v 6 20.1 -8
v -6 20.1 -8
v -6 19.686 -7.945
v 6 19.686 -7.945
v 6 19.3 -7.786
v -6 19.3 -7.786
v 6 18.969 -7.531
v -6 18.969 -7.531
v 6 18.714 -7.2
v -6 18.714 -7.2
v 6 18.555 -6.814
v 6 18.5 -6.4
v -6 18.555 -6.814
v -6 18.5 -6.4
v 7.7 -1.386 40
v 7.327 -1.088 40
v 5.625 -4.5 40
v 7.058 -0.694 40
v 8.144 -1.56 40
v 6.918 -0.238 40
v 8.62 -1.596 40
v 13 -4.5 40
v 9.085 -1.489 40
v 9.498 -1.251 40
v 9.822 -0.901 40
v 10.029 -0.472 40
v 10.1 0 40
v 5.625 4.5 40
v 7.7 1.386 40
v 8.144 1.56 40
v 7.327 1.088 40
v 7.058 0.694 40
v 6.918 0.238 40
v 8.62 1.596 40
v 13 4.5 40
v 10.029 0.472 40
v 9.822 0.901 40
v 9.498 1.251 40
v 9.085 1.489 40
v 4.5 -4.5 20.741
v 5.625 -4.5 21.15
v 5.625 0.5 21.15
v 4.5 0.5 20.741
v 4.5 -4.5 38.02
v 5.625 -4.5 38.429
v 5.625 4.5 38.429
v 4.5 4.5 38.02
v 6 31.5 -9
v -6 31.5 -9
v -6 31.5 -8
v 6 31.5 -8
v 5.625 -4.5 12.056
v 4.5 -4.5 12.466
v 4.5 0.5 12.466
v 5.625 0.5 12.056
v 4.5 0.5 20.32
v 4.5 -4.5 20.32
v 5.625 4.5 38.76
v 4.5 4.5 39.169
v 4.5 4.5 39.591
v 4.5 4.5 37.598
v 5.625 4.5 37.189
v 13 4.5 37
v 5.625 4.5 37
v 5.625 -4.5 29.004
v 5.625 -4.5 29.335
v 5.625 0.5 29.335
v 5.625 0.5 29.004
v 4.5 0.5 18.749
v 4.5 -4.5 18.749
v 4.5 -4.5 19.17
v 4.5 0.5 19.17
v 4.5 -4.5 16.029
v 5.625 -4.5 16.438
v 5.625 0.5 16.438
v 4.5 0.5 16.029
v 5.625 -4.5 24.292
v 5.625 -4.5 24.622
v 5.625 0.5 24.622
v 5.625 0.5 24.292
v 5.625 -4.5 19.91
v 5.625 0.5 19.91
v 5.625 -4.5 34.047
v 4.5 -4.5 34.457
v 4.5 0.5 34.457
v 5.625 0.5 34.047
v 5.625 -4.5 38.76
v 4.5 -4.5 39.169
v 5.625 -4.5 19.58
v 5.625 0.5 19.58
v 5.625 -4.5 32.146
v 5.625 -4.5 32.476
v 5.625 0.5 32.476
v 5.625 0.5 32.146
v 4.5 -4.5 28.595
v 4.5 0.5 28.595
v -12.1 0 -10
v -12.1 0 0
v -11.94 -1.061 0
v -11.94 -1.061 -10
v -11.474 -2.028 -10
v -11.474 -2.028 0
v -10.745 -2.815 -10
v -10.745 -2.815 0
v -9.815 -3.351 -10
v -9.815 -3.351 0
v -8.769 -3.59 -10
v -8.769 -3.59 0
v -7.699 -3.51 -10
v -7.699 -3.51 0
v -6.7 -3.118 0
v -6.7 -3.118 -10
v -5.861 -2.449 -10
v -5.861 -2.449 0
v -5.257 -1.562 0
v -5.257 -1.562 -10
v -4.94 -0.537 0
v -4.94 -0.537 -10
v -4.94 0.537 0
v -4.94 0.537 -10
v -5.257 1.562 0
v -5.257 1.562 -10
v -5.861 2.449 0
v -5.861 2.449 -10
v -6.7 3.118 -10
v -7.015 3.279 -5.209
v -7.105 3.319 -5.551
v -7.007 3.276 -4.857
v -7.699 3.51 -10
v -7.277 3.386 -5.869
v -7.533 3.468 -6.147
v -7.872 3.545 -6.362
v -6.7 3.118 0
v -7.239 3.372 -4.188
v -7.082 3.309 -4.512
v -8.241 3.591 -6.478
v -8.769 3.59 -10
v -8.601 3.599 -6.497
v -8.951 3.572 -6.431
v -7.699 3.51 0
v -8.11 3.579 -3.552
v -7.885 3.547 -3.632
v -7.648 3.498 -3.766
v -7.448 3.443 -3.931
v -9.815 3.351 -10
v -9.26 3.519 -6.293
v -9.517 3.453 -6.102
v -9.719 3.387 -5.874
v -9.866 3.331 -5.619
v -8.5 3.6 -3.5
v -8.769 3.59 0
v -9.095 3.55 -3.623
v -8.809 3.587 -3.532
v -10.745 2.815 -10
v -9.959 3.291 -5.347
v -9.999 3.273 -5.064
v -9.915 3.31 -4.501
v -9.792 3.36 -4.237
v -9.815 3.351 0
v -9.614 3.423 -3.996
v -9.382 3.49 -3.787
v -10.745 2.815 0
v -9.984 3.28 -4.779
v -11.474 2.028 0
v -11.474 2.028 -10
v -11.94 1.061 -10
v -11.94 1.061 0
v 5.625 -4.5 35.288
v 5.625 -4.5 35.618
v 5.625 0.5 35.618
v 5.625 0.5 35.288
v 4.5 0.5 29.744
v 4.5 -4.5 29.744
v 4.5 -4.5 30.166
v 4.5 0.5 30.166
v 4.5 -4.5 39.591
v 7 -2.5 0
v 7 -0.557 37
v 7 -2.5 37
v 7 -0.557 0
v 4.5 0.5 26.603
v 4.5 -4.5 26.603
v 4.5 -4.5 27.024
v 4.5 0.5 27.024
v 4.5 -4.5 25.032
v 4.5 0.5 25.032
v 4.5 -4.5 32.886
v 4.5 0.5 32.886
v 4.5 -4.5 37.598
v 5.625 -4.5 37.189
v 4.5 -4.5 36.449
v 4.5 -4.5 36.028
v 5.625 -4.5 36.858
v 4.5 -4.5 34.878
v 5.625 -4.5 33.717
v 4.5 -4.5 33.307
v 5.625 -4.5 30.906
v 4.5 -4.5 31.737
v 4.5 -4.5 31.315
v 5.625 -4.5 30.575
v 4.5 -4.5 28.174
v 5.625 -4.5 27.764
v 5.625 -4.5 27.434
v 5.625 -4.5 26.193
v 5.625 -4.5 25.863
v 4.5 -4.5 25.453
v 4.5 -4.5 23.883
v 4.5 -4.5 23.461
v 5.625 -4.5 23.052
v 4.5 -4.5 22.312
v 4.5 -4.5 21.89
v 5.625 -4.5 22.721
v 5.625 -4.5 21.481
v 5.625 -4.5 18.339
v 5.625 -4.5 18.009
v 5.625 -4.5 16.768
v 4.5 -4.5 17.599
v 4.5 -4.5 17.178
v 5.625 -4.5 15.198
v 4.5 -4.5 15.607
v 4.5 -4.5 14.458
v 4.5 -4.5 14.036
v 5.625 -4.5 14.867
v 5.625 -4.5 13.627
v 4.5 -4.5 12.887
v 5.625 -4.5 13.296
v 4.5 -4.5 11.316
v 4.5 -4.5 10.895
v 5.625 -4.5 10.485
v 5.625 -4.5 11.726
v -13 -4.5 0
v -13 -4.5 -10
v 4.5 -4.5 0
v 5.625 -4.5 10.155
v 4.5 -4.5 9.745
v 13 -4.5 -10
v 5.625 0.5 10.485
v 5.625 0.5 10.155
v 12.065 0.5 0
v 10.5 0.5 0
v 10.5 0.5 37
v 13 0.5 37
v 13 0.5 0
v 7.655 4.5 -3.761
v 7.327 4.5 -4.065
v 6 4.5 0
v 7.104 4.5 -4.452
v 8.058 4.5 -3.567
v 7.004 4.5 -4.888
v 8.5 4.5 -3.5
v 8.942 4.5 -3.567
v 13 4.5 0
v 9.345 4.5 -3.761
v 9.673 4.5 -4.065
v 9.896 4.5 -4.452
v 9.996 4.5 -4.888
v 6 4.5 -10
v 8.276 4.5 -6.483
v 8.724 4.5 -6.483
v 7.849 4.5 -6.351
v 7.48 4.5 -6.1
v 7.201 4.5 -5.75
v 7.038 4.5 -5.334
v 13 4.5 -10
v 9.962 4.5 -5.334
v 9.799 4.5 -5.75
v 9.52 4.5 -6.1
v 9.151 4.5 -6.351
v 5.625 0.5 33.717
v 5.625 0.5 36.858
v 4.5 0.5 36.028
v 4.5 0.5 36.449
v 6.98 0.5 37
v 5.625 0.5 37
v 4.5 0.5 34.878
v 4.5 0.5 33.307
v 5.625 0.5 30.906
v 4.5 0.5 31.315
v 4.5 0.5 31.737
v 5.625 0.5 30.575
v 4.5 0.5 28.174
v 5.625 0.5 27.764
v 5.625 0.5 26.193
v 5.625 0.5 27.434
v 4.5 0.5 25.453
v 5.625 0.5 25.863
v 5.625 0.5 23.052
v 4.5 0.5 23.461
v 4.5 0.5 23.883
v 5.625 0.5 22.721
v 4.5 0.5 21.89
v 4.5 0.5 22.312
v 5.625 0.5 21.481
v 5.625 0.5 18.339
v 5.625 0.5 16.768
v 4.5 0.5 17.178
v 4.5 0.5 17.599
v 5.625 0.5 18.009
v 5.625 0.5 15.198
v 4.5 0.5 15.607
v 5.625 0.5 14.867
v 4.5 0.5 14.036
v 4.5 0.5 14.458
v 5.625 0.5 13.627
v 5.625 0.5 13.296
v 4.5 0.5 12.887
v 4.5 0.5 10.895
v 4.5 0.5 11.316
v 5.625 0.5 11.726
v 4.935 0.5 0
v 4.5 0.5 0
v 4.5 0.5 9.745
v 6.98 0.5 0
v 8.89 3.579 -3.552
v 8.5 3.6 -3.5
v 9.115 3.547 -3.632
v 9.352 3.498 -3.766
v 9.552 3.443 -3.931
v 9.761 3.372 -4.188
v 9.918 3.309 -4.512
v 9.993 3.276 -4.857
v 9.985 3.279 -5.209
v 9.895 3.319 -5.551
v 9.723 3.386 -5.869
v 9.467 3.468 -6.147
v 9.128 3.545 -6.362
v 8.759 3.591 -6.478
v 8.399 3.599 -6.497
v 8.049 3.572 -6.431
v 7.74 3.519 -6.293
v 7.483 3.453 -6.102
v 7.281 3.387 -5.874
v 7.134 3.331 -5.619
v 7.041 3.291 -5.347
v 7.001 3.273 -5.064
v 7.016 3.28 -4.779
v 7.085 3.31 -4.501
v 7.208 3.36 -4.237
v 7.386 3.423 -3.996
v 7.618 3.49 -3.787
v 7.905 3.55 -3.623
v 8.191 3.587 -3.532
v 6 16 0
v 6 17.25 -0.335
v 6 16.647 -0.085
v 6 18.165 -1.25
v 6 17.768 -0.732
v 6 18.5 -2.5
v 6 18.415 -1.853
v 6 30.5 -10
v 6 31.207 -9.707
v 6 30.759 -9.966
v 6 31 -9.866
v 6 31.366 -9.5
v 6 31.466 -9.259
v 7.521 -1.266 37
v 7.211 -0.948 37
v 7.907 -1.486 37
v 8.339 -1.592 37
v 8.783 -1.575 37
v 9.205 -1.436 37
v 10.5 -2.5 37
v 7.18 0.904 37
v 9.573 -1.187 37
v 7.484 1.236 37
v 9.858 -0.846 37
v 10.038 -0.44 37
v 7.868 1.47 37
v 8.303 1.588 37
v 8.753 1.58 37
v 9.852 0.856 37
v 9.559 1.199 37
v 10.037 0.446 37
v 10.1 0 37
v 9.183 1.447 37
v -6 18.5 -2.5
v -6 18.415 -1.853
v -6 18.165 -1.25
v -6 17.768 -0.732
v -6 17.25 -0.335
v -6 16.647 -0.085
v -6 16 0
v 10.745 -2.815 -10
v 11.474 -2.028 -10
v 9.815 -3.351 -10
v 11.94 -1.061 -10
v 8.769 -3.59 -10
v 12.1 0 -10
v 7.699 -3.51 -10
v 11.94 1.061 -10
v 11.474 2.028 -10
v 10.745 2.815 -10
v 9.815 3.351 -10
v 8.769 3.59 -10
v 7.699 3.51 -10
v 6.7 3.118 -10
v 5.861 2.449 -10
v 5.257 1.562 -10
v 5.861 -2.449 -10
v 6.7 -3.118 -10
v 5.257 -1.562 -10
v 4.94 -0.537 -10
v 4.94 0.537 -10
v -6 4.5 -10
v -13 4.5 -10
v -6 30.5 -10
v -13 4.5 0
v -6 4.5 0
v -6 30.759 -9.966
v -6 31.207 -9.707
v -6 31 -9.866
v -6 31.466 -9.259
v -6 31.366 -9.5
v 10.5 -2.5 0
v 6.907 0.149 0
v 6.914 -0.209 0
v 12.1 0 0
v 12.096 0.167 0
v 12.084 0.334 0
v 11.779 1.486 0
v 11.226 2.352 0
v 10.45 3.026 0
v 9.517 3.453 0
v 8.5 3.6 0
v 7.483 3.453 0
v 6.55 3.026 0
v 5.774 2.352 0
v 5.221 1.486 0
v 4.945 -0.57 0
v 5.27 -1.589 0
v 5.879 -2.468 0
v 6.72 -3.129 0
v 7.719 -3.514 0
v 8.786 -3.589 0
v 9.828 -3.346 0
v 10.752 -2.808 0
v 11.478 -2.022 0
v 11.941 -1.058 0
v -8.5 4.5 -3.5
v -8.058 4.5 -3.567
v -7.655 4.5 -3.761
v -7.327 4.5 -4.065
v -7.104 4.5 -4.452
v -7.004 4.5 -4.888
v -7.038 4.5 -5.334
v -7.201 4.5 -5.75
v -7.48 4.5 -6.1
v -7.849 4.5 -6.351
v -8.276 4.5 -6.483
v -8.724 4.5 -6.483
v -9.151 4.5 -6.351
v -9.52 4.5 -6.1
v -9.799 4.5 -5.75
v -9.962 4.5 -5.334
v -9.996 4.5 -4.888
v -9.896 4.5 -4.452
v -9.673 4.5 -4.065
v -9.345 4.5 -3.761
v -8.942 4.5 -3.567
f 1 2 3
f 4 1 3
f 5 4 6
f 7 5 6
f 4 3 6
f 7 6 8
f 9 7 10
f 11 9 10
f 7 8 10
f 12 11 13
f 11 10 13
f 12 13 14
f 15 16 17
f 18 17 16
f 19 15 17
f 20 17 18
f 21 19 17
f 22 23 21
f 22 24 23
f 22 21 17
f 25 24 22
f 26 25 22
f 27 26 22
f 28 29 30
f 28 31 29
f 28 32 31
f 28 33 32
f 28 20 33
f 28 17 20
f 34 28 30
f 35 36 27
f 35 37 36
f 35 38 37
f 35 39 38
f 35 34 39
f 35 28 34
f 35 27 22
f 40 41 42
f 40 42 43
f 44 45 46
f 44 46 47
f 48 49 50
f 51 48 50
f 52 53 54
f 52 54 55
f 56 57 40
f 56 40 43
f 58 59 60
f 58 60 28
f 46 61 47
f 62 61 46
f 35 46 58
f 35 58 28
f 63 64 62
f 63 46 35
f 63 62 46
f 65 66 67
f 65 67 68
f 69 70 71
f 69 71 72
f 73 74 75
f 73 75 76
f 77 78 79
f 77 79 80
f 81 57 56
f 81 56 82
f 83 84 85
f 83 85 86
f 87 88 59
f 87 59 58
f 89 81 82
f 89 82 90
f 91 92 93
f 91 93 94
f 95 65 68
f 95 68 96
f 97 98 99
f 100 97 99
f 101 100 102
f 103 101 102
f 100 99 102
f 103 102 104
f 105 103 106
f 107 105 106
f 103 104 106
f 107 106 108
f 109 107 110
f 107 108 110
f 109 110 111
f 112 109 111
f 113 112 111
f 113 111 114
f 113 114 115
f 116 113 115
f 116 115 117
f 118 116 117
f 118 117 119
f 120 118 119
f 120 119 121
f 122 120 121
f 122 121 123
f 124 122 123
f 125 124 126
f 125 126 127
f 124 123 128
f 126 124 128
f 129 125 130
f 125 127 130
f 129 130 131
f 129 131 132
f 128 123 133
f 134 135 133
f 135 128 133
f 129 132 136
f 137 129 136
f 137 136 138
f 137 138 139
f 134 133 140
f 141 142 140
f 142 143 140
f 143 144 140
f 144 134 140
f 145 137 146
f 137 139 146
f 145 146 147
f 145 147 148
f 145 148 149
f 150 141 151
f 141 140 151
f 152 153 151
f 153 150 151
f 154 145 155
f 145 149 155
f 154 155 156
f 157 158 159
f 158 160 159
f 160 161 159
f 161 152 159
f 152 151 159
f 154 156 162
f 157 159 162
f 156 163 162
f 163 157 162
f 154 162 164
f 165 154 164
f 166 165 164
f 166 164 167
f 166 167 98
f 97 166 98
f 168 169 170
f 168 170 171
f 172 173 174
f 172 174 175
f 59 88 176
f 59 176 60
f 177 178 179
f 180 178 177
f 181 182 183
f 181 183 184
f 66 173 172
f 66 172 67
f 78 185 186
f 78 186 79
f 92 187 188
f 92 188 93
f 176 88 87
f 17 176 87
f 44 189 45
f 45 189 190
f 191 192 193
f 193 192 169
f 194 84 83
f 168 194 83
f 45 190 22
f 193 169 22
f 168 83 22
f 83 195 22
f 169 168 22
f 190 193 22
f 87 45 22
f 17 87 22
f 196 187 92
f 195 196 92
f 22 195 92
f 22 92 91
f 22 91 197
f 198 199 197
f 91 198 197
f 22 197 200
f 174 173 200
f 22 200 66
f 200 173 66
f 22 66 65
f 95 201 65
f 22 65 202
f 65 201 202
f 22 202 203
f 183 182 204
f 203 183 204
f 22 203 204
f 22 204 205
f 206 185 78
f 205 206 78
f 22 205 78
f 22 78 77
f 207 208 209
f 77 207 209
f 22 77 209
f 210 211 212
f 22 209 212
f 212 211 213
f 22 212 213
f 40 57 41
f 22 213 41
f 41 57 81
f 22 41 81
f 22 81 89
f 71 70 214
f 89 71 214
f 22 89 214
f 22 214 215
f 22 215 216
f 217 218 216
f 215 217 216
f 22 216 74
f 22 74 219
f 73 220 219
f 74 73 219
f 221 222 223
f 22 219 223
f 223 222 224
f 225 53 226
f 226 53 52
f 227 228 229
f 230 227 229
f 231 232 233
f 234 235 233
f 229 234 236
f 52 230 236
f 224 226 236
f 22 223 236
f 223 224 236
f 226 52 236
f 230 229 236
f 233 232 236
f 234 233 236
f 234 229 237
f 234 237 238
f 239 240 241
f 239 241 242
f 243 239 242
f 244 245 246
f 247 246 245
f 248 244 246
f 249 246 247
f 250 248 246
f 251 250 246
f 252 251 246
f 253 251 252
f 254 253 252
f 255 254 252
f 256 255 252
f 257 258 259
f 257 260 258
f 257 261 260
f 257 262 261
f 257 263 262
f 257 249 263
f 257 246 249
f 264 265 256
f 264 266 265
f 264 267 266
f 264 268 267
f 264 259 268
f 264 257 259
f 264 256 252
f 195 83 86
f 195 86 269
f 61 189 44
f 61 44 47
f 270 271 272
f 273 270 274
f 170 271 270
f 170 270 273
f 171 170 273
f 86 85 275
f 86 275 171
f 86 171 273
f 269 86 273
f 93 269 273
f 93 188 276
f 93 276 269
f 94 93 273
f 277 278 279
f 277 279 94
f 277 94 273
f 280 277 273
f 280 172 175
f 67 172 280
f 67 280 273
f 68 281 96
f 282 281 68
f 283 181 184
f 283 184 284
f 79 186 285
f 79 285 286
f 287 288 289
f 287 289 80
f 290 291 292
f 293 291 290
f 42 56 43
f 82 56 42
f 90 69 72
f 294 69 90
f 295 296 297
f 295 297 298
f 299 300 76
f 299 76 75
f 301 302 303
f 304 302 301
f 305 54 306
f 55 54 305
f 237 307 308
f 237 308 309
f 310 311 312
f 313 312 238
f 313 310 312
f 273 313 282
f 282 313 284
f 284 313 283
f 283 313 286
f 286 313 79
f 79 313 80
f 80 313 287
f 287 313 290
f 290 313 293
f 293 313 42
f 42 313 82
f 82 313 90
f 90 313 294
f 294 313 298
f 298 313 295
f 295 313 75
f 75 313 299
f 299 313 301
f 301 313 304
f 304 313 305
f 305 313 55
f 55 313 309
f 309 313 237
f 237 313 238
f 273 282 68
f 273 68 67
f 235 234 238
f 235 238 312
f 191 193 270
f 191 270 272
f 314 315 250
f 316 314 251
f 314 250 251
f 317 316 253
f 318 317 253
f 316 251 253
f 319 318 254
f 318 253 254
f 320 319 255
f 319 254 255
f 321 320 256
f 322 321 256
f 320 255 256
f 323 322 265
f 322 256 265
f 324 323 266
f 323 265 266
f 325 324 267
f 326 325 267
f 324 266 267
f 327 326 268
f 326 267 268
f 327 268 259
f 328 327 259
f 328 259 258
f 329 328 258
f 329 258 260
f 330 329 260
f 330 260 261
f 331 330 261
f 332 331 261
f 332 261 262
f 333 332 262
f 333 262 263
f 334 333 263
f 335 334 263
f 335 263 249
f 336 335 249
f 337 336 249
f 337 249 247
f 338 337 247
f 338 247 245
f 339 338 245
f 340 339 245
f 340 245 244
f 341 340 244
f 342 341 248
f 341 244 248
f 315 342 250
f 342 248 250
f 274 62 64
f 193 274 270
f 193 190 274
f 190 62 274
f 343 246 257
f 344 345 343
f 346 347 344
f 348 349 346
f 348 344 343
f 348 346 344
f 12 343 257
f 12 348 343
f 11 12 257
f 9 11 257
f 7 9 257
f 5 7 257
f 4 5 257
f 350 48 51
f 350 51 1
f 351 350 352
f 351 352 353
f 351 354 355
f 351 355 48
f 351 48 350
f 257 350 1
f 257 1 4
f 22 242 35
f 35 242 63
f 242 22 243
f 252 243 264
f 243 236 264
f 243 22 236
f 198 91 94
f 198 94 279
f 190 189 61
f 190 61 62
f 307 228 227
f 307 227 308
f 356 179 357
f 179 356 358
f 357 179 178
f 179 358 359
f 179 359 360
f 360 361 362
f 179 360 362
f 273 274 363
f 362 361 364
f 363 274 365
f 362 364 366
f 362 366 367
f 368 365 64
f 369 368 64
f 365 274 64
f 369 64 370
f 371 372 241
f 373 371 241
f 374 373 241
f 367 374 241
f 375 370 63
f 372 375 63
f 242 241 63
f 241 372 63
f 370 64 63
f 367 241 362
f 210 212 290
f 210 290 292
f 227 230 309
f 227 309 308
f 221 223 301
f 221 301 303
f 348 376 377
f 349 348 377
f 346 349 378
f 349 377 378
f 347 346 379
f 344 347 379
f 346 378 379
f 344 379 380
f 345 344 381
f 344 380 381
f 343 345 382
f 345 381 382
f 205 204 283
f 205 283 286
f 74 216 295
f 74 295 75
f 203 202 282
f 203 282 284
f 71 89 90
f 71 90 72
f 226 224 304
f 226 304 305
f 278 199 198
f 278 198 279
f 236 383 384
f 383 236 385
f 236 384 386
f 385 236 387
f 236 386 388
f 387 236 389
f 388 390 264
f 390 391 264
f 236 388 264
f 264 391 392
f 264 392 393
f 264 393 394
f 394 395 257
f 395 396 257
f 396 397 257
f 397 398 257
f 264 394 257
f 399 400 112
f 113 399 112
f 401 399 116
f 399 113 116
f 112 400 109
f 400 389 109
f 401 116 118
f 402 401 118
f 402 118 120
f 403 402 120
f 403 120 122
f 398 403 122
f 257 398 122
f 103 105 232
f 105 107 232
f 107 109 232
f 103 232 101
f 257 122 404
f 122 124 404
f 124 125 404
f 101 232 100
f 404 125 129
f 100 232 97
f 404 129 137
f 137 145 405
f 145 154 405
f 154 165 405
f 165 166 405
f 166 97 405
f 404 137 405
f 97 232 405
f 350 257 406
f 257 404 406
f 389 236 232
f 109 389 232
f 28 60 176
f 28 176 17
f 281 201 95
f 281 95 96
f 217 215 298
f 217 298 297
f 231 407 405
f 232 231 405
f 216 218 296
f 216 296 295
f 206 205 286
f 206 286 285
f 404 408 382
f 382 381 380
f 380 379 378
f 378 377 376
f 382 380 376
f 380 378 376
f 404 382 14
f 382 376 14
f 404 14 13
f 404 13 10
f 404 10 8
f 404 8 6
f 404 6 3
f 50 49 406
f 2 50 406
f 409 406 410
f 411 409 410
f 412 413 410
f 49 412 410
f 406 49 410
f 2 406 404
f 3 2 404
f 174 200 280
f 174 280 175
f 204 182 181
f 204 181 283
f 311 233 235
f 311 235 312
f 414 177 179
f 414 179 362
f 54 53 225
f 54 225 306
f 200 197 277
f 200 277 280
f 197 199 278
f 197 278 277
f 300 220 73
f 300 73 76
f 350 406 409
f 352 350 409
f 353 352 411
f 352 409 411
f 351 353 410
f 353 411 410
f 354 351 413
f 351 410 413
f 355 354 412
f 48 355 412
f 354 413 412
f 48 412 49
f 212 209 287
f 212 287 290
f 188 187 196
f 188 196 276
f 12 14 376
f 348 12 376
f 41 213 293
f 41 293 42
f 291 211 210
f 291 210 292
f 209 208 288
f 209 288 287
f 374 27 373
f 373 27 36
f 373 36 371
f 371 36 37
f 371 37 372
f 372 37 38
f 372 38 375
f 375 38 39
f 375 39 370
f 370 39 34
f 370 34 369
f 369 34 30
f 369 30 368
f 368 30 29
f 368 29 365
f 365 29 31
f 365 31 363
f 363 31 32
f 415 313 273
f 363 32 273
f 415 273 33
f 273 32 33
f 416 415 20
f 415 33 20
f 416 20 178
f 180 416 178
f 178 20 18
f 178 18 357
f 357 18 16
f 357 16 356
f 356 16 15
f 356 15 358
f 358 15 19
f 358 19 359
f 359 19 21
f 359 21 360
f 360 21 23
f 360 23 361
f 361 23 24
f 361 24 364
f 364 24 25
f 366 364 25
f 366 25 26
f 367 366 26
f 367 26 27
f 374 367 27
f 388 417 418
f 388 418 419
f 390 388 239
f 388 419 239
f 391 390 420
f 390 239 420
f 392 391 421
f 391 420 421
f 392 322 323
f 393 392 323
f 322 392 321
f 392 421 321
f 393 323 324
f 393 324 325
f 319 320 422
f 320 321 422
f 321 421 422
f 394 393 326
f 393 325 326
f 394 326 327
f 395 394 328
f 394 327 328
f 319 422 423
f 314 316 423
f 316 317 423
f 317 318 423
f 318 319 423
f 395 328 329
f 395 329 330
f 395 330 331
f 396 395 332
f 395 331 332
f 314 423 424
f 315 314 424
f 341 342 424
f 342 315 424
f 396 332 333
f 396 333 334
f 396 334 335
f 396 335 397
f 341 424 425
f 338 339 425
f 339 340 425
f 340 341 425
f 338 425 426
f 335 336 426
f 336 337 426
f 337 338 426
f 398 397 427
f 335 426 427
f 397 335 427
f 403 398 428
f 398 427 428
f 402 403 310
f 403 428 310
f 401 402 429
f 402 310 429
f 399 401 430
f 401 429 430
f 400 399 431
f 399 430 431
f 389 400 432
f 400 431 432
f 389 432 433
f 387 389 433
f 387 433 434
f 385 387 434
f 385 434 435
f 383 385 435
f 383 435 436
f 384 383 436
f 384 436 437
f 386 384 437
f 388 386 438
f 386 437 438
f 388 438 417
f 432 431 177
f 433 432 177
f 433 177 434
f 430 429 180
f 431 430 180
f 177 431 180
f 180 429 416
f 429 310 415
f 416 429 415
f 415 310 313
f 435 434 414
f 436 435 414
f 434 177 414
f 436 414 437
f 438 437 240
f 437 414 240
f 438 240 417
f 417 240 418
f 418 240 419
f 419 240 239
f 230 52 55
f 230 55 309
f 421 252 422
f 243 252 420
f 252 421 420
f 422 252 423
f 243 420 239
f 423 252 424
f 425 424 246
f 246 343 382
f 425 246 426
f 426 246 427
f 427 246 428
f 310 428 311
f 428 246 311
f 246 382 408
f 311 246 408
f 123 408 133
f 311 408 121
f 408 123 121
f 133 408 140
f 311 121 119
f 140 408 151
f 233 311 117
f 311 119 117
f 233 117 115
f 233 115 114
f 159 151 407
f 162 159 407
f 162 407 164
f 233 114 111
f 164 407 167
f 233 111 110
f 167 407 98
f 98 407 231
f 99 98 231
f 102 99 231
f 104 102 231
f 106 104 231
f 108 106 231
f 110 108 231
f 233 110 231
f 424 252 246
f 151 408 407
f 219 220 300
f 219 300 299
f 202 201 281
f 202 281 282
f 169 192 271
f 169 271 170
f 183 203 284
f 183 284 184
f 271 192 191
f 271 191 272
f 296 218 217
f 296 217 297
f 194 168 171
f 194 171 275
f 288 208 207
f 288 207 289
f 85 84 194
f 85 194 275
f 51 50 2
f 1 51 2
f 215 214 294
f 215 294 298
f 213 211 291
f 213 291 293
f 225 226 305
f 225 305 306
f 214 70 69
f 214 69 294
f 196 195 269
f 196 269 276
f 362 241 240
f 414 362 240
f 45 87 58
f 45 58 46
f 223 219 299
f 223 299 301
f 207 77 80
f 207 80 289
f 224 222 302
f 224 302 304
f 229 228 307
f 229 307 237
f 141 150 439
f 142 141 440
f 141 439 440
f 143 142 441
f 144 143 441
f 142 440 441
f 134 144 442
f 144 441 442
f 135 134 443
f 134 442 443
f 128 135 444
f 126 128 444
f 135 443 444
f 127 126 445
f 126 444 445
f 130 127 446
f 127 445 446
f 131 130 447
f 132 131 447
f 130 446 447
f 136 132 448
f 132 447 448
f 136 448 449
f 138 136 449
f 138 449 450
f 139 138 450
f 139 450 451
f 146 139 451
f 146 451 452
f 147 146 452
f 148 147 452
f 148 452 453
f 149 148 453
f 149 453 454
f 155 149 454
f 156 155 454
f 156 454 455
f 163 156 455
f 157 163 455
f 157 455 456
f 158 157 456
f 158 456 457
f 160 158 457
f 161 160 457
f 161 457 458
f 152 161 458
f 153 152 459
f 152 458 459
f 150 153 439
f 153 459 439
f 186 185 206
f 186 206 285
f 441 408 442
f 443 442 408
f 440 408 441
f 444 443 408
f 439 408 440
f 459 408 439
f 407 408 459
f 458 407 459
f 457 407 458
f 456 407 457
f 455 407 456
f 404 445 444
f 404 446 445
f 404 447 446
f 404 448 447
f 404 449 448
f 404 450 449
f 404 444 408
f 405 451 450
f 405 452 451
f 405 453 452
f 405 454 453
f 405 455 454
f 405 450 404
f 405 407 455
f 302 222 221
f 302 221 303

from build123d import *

# Parameters (mm, degrees)
SKETCH_1_W             = 26
SKETCH_1_H             = 9
EXTRUDE_1_DEPTH        = 10
SKETCH_2_R             = 3.6
CUT_EXTRUDE_1_DEPTH    = 18.007351352
EXTRUDE_2_DEPTH        = 26
CUT_EXTRUDE_2_DEPTH    = 7
SKETCH_7_W             = 8.5
SKETCH_7_H             = 9
EXTRUDE_3_DEPTH        = 40
SKETCH_8_R             = 1.6
CUT_EXTRUDE_3_DEPTH    = 40
SKETCH_9_W             = 3.5
SKETCH_9_H             = 37
CUT_EXTRUDE_4_DEPTH    = 7
CUT_EXTRUDE_12_DEPTH   = 50.979995998
PATTERN_START          = -4.5
PATTERN_LINEAR_2_DEPTH = 9
SKETCH_22_W            = 8.5
SKETCH_22_H            = 37
CUT_EXTRUDE_13_DEPTH   = 4
SKETCH_23_R            = 1.5
CUT_EXTRUDE_14_DEPTH   = 4


# Read off the part's stored shape, not the designer's step: 阵列(线性)2
with BuildPart() as part:
    # 草图1 → 凸台-拉伸1 (new body)
    with BuildSketch(Plane.XY):
        Rectangle(SKETCH_1_W, SKETCH_1_H)
    extrude(amount=-EXTRUDE_1_DEPTH)

    # 草图2 → 切除-拉伸1 (cut, through all)
    with BuildSketch(Plane.XY):
        with Locations((8.5, 0)):
            Circle(SKETCH_2_R)
        with Locations(Location((-8.5, 0, 0), (0, 0, 180))):
            Circle(SKETCH_2_R)
    extrude(amount=-CUT_EXTRUDE_1_DEPTH, mode=Mode.SUBTRACT)

    # 草图5 → 凸台-拉伸2 (add, through all)
    with BuildSketch(Plane.ZY.offset(13)):
        with BuildLine():
            Line((0, 4.5), (-10, 4.5))
            Line((-10, 4.5), (-10, 8.301419967))
            Line((-10, 8.301419967), (-10, 30.5))
            ThreePointArc((-10, 30.5), (-9.707106781, 31.207106781), (-9, 31.5))
            Line((-9, 31.5), (-8, 31.5))
            Line((-8, 31.5), (-8, 20.1))
            ThreePointArc((-8, 20.1), (-7.53137085, 18.96862915), (-6.4, 18.5))
            Line((-6.4, 18.5), (-2.5, 18.5))
            ThreePointArc((-2.5, 18.5), (-0.732233047, 17.767766953), (0, 16))
            Line((0, 16), (0, 4.5))
        make_face()
    extrude(amount=-EXTRUDE_2_DEPTH)

    # 草图5<2> → 切除-拉伸2 (cut)
    with BuildSketch(Plane.ZY.offset(13)):
        with BuildLine():
            Line((0, 4.5), (-10, 4.5))
            Line((-10, 4.5), (-10, 8.301419967))
            Line((-10, 8.301419967), (-10, 30.5))
            ThreePointArc((-10, 30.5), (-9.707106781, 31.207106781), (-9, 31.5))
            Line((-9, 31.5), (-8, 31.5))
            Line((-8, 31.5), (-8, 20.1))
            ThreePointArc((-8, 20.1), (-7.53137085, 18.96862915), (-6.4, 18.5))
            Line((-6.4, 18.5), (-2.5, 18.5))
            ThreePointArc((-2.5, 18.5), (-0.732233047, 17.767766953), (0, 16))
            Line((0, 16), (0, 4.5))
        make_face()
    cut_extrude_2 = extrude(amount=-CUT_EXTRUDE_2_DEPTH, mode=Mode.SUBTRACT)

    # 镜向1: 切除-拉伸2 across plane
    add(cut_extrude_2.mirror(Plane(origin=(0, 0, 0), x_dir=(0, 0, 1), z_dir=(1, 0, 0))), mode=Mode.SUBTRACT)

    # 草图7 → 凸台-拉伸3 (add)
    with BuildSketch(Plane.XY):
        with Locations((8.75, 0)):
            Rectangle(SKETCH_7_W, SKETCH_7_H)
    extrude(amount=EXTRUDE_3_DEPTH)

    # 草图8 → 切除-拉伸3 (cut)
    with BuildSketch(Plane.XY.offset(40)):
        with Locations((8.5, 0)):
            Circle(SKETCH_8_R)
    extrude(amount=-CUT_EXTRUDE_3_DEPTH, mode=Mode.SUBTRACT)

    # 草图9 → 切除-拉伸4 (cut)
    with BuildSketch(Plane(origin=(0, 4.5, 0), x_dir=(1, 0, 0), z_dir=(0, 1, 0))):
        with Locations((8.75, -18.5)):
            Rectangle(SKETCH_9_W, SKETCH_9_H)
    extrude(amount=-CUT_EXTRUDE_4_DEPTH, mode=Mode.SUBTRACT)

    # 草图10 → 切除-拉伸12 (cut, through all)
    with BuildSketch(Plane(origin=(0, 4.5, 0), x_dir=(1, 0, 0), z_dir=(0, 1, 0))):
        Polygon((5.625, -40), (5.625, -40.330435371), (4.5, -40.739901884), (4.5, -39.590533486), align=None)
    extrude(amount=-CUT_EXTRUDE_12_DEPTH, mode=Mode.SUBTRACT)

    # 阵列(线性)2 outline → 阵列(线性)2 (cut)
    with BuildSketch(Plane(origin=(0, 0, 0), x_dir=(1, 0, 0), z_dir=(0, 1, 0)).offset(PATTERN_START)):
        Polygon((5.625, -10.485305161), (5.625, -10.154869791), (4.5, -9.745403277), (4.5, -10.894771675), align=None)
        Polygon((5.625, -38.429203673), (4.5, -38.01973716), (4.5, -39.169105557), (5.625, -38.759639044), align=None)
        Polygon((5.625, -36.858407346), (4.5, -36.448940833), (4.5, -37.598309231), (5.625, -37.188842717), align=None)
        Polygon((5.625, -35.28761102), (4.5, -34.878144506), (4.5, -36.027512904), (5.625, -35.61804639), align=None)
        Polygon((5.625, -33.716814693), (4.5, -33.307348179), (4.5, -34.456716577), (5.625, -34.047250063), align=None)
        Polygon((5.625, -32.146018366), (4.5, -31.736551852), (4.5, -32.88592025), (5.625, -32.476453737), align=None)
        Polygon((5.625, -30.575222039), (4.5, -30.165755526), (4.5, -31.315123923), (5.625, -30.90565741), align=None)
        Polygon((5.625, -29.004425712), (4.5, -28.594959199), (4.5, -29.744327597), (5.625, -29.334861083), align=None)
        Polygon((5.625, -27.433629386), (4.5, -27.024162872), (4.5, -28.17353127), (5.625, -27.764064756), align=None)
        Polygon((5.625, -25.862833059), (4.5, -25.453366545), (4.5, -26.602734943), (5.625, -26.193268429), align=None)
        Polygon((5.625, -24.292036732), (4.5, -23.882570219), (4.5, -25.031938616), (5.625, -24.622472103), align=None)
        Polygon((5.625, -22.721240405), (4.5, -22.311773892), (4.5, -23.461142289), (5.625, -23.051675776), align=None)
        Polygon((5.625, -21.150444078), (4.5, -20.740977565), (4.5, -21.890345963), (5.625, -21.480879449), align=None)
        Polygon((5.625, -19.579647752), (4.5, -19.170181238), (4.5, -20.319549636), (5.625, -19.910083122), align=None)
        Polygon((5.625, -18.008851425), (4.5, -17.599384911), (4.5, -18.748753309), (5.625, -18.339286795), align=None)
        Polygon((5.625, -16.438055098), (4.5, -16.028588585), (4.5, -17.177956982), (5.625, -16.768490469), align=None)
        Polygon((5.625, -14.867258771), (4.5, -14.457792258), (4.5, -15.607160655), (5.625, -15.197694142), align=None)
        Polygon((5.625, -13.296462444), (4.5, -12.886995931), (4.5, -14.036364329), (5.625, -13.626897815), align=None)
        Polygon((5.625, -11.725666118), (4.5, -11.316199604), (4.5, -12.465568002), (5.625, -12.056101488), align=None)
    extrude(amount=PATTERN_LINEAR_2_DEPTH, mode=Mode.SUBTRACT)

    # 草图22 → 切除-拉伸13 (cut)
    with BuildSketch(Plane(origin=(0, 4.5, 0), x_dir=(1, 0, 0), z_dir=(0, 1, 0))):
        with Locations((8.75, -18.5)):
            Rectangle(SKETCH_22_W, SKETCH_22_H)
    extrude(amount=-CUT_EXTRUDE_13_DEPTH, mode=Mode.SUBTRACT)

    # 草图23 → 切除-拉伸14 (cut)
    with BuildSketch(Plane(origin=(0, 4.5, 0), x_dir=(1, 0, 0), z_dir=(0, 1, 0))):
        with Locations(Location((8.5, 5, 0), (0, 0, 270))):
            Circle(SKETCH_23_R)
        with Locations(Location((-8.5, 5, 0), (0, 0, 270))):
            Circle(SKETCH_23_R)
    extrude(amount=-CUT_EXTRUDE_14_DEPTH, mode=Mode.SUBTRACT)


solid = part.part
